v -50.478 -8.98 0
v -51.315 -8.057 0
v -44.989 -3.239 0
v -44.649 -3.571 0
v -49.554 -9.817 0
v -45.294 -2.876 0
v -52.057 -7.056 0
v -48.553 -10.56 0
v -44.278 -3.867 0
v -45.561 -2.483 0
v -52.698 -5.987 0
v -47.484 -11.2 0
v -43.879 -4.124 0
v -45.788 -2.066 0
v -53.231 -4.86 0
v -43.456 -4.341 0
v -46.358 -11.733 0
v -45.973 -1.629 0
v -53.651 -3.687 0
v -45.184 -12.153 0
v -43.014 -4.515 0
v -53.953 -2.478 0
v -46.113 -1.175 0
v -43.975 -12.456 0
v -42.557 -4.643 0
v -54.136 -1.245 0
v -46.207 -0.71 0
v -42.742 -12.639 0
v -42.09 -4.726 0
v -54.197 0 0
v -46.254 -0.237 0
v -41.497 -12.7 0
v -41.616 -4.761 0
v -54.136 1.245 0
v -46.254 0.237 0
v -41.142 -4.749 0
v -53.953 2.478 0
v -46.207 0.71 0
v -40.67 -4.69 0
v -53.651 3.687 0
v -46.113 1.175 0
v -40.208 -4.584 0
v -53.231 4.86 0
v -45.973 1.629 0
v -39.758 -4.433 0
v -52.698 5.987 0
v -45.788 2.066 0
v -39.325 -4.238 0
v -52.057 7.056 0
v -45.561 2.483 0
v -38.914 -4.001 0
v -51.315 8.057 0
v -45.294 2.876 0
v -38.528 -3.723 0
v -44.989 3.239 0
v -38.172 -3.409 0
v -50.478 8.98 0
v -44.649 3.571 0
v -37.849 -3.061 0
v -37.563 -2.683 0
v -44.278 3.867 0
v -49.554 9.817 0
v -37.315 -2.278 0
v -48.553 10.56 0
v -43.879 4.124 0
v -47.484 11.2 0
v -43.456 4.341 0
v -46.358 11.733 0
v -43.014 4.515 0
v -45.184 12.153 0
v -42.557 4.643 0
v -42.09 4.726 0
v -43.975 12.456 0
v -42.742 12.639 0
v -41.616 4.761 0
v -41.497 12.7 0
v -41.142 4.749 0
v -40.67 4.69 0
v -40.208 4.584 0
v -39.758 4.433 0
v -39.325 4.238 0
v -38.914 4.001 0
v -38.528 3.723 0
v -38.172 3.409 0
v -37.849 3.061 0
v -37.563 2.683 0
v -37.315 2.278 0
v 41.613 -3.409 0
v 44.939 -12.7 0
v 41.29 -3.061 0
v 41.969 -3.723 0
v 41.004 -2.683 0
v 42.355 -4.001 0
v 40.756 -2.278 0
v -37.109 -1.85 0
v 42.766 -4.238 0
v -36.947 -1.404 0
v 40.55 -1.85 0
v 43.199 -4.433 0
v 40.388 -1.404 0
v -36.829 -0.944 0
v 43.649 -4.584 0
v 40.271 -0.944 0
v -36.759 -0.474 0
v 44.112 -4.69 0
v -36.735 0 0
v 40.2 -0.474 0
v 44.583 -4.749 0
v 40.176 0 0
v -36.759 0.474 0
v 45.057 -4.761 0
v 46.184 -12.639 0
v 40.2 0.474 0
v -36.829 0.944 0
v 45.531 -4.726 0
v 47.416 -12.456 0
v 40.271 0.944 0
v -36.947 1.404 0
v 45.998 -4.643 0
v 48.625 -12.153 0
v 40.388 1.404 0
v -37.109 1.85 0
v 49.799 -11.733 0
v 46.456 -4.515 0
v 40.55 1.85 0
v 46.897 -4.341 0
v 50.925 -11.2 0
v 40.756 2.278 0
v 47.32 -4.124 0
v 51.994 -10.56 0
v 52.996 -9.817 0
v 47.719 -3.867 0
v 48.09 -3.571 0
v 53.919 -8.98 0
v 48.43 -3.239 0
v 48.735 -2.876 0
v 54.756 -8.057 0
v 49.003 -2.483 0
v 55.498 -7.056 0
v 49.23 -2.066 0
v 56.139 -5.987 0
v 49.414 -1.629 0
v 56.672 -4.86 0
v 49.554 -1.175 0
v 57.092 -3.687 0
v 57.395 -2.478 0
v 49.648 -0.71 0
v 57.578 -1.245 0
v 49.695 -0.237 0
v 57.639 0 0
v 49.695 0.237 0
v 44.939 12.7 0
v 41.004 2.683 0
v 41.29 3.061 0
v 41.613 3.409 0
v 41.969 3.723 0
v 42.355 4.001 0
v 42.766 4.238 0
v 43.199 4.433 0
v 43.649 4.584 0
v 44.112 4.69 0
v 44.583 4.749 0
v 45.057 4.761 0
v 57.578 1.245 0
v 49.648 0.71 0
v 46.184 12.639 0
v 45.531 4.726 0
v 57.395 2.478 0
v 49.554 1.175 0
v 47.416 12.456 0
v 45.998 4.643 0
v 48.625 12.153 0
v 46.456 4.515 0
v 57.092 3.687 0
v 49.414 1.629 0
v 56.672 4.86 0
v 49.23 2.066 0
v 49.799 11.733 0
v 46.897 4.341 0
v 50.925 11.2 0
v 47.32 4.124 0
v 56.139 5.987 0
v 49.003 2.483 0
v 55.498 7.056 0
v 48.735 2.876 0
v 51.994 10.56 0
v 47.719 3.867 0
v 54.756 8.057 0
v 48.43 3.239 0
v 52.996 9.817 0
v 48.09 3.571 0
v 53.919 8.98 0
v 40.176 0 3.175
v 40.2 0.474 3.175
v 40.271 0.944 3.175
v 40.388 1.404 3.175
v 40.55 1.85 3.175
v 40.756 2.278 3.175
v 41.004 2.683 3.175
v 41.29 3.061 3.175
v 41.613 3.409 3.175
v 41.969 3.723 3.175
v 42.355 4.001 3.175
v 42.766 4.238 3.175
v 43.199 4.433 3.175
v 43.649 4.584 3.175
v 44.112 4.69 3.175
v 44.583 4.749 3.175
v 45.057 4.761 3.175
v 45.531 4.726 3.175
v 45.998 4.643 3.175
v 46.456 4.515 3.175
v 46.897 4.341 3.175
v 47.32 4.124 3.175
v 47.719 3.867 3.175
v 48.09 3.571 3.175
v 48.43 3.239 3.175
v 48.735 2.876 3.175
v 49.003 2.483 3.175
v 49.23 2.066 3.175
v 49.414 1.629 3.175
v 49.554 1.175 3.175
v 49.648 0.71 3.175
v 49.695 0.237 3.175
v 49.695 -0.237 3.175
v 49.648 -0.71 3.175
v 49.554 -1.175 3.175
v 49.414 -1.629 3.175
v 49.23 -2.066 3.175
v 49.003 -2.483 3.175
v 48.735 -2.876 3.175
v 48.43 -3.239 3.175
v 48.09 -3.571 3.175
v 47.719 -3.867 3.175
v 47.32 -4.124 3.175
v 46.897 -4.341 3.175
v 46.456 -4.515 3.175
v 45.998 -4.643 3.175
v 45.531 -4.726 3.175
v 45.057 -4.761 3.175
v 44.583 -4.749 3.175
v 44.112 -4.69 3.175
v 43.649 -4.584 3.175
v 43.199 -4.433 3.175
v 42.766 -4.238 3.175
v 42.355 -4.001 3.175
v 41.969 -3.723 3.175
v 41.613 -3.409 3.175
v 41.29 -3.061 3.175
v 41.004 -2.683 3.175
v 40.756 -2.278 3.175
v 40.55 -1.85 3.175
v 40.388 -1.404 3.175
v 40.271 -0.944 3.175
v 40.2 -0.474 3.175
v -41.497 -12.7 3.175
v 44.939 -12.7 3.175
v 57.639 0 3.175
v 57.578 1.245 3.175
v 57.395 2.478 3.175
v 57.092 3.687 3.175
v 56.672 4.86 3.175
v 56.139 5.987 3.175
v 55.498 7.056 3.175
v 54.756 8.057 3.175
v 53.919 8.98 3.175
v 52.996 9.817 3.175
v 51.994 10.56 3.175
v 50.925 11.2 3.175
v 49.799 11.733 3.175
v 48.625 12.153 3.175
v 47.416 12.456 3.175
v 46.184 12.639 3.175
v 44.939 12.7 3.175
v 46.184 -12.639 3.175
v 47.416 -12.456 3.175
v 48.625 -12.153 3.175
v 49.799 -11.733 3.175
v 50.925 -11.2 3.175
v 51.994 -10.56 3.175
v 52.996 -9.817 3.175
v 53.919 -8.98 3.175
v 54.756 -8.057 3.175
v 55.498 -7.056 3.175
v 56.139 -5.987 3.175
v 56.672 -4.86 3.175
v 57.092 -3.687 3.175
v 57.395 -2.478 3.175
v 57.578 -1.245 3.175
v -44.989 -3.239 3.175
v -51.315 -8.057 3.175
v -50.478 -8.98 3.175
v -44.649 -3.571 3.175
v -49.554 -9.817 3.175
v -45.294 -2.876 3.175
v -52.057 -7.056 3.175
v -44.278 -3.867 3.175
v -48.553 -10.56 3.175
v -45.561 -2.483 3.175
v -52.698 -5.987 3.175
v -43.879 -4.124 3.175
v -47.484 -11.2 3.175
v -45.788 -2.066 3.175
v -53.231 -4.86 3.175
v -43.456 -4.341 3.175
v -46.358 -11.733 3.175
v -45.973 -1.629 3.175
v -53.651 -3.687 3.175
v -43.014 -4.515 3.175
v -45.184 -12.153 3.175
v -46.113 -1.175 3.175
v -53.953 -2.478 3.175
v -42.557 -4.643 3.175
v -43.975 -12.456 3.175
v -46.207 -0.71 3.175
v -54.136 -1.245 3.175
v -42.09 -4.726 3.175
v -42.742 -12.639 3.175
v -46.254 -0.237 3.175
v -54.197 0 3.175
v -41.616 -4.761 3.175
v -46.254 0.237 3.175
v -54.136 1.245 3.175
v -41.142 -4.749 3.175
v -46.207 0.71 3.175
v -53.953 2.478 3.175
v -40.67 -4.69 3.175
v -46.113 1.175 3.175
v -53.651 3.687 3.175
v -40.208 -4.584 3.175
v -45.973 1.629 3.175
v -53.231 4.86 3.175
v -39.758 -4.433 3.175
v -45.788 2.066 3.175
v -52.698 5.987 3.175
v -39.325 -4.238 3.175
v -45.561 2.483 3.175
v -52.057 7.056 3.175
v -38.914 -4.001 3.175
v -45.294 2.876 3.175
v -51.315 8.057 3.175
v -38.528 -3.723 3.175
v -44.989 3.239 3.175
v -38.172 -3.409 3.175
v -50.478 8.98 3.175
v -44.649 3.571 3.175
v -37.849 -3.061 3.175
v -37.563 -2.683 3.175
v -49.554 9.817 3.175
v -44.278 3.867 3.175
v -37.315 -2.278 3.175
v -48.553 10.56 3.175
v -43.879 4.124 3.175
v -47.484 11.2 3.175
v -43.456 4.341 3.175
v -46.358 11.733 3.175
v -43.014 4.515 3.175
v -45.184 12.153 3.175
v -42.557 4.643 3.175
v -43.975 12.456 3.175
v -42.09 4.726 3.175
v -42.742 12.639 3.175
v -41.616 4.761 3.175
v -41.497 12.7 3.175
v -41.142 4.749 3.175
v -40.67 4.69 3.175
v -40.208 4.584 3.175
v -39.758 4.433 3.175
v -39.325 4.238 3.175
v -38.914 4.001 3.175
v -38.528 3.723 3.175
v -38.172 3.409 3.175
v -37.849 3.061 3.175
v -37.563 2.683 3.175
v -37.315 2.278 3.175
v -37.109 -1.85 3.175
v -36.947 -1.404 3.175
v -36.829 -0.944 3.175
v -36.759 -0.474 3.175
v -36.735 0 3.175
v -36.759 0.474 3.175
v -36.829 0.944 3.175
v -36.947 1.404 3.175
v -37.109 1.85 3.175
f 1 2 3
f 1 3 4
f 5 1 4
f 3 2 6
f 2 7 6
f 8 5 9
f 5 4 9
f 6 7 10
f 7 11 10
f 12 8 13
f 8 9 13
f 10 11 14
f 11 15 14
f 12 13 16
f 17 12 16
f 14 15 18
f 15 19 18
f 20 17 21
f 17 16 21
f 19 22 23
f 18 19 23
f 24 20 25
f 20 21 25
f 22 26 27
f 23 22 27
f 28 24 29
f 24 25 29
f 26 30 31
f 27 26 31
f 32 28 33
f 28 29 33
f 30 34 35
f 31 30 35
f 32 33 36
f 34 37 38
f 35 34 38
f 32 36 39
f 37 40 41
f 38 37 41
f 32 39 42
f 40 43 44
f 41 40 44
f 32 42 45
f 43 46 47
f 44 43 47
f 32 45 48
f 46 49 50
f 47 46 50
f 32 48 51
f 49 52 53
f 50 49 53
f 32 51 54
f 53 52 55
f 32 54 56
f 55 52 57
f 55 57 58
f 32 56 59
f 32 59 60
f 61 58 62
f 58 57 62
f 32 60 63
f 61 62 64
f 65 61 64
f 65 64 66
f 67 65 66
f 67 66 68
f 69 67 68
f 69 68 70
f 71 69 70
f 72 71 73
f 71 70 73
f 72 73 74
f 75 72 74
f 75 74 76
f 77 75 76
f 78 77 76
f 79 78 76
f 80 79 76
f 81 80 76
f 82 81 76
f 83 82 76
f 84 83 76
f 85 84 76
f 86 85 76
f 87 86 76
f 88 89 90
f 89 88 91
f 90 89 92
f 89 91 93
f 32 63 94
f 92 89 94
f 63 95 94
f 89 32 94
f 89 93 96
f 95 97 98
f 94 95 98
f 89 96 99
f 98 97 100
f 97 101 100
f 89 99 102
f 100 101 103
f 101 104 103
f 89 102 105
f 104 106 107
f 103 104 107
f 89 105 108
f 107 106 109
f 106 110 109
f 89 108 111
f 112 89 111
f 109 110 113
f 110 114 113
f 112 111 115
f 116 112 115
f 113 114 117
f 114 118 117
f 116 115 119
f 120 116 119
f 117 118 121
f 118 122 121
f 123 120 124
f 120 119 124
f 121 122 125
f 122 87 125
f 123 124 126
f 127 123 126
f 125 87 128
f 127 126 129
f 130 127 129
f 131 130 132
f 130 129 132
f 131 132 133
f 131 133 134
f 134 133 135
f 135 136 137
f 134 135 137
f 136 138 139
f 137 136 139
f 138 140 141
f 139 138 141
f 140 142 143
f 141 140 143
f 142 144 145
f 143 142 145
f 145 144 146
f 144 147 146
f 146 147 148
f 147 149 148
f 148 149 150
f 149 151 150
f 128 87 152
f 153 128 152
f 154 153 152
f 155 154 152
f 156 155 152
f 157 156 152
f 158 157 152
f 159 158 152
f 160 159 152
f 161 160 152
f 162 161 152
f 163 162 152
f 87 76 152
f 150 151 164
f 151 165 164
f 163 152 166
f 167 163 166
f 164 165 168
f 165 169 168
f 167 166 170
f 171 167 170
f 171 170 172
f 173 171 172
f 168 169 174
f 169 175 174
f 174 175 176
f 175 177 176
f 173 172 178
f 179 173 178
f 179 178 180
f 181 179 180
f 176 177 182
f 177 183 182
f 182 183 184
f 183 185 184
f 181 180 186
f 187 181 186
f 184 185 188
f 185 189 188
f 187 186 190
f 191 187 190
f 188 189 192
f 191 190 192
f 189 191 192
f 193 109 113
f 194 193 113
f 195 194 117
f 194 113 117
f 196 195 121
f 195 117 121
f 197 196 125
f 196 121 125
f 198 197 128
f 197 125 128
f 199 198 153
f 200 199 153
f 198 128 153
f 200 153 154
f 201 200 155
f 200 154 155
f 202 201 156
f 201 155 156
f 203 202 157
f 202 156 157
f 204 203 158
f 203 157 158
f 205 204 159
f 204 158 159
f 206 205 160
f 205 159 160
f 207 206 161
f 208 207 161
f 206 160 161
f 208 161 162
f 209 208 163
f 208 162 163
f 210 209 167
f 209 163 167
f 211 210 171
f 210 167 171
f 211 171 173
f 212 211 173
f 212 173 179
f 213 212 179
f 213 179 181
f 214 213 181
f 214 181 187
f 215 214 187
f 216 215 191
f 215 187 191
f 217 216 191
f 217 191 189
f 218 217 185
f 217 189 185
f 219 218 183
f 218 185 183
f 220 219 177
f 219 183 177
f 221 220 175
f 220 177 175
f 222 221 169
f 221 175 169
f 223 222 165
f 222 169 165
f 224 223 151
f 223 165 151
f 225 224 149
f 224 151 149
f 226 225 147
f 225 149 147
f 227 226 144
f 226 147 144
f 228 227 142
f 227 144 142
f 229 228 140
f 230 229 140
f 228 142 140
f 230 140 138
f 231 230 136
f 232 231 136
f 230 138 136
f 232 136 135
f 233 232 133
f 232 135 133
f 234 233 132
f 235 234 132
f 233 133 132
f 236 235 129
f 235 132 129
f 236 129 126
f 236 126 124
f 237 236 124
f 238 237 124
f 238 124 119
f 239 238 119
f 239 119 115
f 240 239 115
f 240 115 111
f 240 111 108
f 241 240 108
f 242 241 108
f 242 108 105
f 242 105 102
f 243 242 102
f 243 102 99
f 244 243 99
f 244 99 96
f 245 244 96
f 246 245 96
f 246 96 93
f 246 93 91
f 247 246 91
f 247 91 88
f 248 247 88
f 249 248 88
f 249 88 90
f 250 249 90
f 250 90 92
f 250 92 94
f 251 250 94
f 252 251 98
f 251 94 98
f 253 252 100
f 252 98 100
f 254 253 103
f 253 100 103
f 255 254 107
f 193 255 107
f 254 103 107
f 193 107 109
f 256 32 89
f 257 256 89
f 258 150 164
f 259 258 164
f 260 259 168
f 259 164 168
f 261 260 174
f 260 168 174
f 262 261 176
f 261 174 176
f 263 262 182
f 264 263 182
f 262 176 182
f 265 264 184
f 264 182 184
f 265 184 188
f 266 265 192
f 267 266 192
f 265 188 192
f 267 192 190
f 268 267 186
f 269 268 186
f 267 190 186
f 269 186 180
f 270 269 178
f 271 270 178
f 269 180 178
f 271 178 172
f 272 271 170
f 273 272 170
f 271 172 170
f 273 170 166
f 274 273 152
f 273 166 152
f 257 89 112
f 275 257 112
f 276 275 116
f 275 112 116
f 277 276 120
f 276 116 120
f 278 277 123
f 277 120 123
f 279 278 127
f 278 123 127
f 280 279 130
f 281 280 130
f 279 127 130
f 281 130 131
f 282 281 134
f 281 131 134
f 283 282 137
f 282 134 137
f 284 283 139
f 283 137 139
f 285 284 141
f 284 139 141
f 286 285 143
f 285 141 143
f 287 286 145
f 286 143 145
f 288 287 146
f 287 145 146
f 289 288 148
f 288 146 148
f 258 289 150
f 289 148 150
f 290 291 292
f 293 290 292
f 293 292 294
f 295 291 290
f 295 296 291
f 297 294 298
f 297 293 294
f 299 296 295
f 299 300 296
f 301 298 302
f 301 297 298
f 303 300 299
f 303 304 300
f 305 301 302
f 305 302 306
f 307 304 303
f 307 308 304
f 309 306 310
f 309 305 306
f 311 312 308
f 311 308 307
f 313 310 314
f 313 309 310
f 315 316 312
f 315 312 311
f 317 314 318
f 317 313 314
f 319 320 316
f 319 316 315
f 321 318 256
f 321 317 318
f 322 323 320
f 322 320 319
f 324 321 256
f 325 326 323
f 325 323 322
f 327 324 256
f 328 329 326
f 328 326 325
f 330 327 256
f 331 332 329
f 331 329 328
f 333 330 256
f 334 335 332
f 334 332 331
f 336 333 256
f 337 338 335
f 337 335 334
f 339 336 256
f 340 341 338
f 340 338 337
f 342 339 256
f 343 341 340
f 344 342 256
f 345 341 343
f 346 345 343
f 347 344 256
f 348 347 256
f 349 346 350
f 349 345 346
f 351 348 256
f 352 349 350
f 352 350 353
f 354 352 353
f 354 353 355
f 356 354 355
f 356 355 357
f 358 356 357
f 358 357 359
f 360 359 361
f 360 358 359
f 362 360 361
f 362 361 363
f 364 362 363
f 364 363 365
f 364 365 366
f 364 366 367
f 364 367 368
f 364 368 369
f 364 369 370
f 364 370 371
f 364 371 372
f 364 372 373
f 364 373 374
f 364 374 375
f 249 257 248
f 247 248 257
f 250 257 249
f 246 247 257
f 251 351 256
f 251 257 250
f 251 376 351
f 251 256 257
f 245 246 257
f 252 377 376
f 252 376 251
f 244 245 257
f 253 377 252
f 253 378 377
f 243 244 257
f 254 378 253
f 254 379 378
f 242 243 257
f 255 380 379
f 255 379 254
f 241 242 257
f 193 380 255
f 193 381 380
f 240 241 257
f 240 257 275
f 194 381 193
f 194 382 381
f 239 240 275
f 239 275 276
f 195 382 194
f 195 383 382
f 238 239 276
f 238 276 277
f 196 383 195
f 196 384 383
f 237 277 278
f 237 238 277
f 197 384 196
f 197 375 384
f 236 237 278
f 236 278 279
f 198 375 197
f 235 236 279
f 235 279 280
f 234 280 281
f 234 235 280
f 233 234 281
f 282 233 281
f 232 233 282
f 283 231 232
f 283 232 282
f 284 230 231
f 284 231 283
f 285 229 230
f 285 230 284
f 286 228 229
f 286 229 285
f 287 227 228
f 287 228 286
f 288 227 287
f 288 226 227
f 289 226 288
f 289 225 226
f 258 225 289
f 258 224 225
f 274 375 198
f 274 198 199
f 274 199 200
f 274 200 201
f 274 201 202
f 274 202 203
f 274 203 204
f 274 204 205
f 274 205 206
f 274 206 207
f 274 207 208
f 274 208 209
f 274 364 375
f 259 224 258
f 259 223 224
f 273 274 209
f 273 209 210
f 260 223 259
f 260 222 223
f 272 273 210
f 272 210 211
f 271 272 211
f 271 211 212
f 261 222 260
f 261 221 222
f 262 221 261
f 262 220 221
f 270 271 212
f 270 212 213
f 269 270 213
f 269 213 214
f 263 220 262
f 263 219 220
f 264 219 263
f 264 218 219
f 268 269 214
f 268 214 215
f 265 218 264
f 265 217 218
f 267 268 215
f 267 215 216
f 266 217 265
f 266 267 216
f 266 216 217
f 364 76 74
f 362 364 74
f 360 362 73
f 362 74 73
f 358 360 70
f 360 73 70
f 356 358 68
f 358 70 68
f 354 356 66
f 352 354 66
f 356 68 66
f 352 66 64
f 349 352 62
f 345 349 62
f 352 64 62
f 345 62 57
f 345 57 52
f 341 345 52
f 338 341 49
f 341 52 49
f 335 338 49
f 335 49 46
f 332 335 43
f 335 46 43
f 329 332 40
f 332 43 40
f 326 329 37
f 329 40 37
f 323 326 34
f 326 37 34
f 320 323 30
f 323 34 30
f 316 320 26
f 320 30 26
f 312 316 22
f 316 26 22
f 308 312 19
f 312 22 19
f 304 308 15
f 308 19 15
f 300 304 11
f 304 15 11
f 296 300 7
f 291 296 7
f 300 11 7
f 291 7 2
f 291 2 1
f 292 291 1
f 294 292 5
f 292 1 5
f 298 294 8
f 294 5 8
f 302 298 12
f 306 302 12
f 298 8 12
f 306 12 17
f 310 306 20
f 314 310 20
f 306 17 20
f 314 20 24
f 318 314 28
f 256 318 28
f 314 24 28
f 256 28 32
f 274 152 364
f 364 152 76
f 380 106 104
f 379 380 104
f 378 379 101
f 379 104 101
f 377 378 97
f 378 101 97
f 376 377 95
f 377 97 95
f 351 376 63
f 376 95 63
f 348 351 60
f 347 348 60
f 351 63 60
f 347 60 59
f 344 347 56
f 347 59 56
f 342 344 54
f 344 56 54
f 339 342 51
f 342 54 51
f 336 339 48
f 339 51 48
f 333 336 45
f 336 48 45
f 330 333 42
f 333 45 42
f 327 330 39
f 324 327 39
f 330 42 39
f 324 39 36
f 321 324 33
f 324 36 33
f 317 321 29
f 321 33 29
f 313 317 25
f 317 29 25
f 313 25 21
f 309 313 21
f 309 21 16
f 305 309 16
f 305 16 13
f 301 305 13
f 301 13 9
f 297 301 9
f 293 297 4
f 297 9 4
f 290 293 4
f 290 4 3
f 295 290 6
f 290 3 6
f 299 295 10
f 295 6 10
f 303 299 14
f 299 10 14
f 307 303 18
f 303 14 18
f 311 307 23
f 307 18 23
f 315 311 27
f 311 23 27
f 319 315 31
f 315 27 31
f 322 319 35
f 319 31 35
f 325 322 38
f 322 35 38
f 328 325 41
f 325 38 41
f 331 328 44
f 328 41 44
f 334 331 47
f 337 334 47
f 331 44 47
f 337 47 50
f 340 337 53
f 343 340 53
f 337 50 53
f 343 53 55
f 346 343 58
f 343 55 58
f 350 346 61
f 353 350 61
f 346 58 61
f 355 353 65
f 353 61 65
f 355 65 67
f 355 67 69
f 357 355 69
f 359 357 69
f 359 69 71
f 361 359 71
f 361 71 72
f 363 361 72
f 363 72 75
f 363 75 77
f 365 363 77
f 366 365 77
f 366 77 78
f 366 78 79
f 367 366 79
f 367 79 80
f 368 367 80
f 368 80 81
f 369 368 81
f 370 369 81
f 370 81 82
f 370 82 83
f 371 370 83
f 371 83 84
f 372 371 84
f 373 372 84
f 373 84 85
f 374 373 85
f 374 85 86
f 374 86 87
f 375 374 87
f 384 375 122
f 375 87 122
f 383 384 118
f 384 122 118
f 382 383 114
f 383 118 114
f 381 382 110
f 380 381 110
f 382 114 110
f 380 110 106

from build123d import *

# Parameters (mm, degrees)
F1_DEPTH = 3.175


# Not quite as in the source:
# - a length typed as a fraction of an inch, garbled in the dataset ("3 / 203.2 mm" for 3/8 in), is restored


with BuildPart() as f1:
    # F0 (on Top) → F1 (new body)
    with BuildSketch(Plane.XY):
        with BuildLine():
            ThreePointArc((-41.4974734498, 12.7), (-32.5172173287, 8.9802561211), (-28.7974734498, 0))
            Line((-28.7974734498, 0), (32.2387265502, 0))
            ThreePointArc((32.2387265502, 0), (35.9584704291, 8.9802561211), (44.9387265502, 12.7))
            Line((44.9387265502, 12.7), (-41.4974734498, 12.7))
        make_face()
        with BuildLine():
            ThreePointArc((-41.4974734498, -4.7625), (-44.8650694952, 3.3675960454), (-36.7349734498, 0))
            Line((-36.7349734498, 0), (-28.7974734498, 0))
            ThreePointArc((-28.7974734498, 0), (-32.5172173287, 8.9802561211), (-41.4974734498, 12.7))
            ThreePointArc((-41.4974734498, 12.7), (-54.1974734498, 0), (-41.4974734498, -12.7))
            Line((-41.4974734498, -12.7), (-41.4974734498, -4.7625))
        make_face()
        with BuildLine():
            Line((-28.7974734498, 0), (-36.7349734498, 0))
            ThreePointArc((-36.7349734498, 0), (-38.1298774044, -3.3675960454), (-41.4974734498, -4.7625))
            Line((-41.4974734498, -4.7625), (-41.4974734498, -12.7))
            ThreePointArc((-41.4974734498, -12.7), (-32.5172173287, -8.9802561211), (-28.7974734498, 0))
        make_face()
        with BuildLine():
            Line((32.2387265502, 0), (-28.7974734498, 0))
            ThreePointArc((-28.7974734498, 0), (-32.5172173287, -8.9802561211), (-41.4974734498, -12.7))
            Line((-41.4974734498, -12.7), (44.9387265502, -12.7))
            ThreePointArc((44.9387265502, -12.7), (35.9584704291, -8.9802561211), (32.2387265502, 0))
        make_face()
        with BuildLine():
            ThreePointArc((44.9387265502, 12.7), (35.9584704291, 8.9802561211), (32.2387265502, 0))
            ThreePointArc((32.2387265502, 0), (35.9584704291, -8.9802561211), (44.9387265502, -12.7))
            ThreePointArc((44.9387265502, -12.7), (53.9189826713, -8.9802561211), (57.6387265502, 0))
            ThreePointArc((57.6387265502, 0), (53.9189826713, 8.9802561211), (44.9387265502, 12.7))
        make_face()
        with BuildLine():
            ThreePointArc((49.7012265502, 0), (44.9387265502, -4.7625), (40.1762265502, 0))
            ThreePointArc((40.1762265502, 0), (44.9387265502, 4.7625), (49.7012265502, 0))
        make_face(mode=Mode.SUBTRACT)
    extrude(amount=F1_DEPTH)


solid = f1.part
